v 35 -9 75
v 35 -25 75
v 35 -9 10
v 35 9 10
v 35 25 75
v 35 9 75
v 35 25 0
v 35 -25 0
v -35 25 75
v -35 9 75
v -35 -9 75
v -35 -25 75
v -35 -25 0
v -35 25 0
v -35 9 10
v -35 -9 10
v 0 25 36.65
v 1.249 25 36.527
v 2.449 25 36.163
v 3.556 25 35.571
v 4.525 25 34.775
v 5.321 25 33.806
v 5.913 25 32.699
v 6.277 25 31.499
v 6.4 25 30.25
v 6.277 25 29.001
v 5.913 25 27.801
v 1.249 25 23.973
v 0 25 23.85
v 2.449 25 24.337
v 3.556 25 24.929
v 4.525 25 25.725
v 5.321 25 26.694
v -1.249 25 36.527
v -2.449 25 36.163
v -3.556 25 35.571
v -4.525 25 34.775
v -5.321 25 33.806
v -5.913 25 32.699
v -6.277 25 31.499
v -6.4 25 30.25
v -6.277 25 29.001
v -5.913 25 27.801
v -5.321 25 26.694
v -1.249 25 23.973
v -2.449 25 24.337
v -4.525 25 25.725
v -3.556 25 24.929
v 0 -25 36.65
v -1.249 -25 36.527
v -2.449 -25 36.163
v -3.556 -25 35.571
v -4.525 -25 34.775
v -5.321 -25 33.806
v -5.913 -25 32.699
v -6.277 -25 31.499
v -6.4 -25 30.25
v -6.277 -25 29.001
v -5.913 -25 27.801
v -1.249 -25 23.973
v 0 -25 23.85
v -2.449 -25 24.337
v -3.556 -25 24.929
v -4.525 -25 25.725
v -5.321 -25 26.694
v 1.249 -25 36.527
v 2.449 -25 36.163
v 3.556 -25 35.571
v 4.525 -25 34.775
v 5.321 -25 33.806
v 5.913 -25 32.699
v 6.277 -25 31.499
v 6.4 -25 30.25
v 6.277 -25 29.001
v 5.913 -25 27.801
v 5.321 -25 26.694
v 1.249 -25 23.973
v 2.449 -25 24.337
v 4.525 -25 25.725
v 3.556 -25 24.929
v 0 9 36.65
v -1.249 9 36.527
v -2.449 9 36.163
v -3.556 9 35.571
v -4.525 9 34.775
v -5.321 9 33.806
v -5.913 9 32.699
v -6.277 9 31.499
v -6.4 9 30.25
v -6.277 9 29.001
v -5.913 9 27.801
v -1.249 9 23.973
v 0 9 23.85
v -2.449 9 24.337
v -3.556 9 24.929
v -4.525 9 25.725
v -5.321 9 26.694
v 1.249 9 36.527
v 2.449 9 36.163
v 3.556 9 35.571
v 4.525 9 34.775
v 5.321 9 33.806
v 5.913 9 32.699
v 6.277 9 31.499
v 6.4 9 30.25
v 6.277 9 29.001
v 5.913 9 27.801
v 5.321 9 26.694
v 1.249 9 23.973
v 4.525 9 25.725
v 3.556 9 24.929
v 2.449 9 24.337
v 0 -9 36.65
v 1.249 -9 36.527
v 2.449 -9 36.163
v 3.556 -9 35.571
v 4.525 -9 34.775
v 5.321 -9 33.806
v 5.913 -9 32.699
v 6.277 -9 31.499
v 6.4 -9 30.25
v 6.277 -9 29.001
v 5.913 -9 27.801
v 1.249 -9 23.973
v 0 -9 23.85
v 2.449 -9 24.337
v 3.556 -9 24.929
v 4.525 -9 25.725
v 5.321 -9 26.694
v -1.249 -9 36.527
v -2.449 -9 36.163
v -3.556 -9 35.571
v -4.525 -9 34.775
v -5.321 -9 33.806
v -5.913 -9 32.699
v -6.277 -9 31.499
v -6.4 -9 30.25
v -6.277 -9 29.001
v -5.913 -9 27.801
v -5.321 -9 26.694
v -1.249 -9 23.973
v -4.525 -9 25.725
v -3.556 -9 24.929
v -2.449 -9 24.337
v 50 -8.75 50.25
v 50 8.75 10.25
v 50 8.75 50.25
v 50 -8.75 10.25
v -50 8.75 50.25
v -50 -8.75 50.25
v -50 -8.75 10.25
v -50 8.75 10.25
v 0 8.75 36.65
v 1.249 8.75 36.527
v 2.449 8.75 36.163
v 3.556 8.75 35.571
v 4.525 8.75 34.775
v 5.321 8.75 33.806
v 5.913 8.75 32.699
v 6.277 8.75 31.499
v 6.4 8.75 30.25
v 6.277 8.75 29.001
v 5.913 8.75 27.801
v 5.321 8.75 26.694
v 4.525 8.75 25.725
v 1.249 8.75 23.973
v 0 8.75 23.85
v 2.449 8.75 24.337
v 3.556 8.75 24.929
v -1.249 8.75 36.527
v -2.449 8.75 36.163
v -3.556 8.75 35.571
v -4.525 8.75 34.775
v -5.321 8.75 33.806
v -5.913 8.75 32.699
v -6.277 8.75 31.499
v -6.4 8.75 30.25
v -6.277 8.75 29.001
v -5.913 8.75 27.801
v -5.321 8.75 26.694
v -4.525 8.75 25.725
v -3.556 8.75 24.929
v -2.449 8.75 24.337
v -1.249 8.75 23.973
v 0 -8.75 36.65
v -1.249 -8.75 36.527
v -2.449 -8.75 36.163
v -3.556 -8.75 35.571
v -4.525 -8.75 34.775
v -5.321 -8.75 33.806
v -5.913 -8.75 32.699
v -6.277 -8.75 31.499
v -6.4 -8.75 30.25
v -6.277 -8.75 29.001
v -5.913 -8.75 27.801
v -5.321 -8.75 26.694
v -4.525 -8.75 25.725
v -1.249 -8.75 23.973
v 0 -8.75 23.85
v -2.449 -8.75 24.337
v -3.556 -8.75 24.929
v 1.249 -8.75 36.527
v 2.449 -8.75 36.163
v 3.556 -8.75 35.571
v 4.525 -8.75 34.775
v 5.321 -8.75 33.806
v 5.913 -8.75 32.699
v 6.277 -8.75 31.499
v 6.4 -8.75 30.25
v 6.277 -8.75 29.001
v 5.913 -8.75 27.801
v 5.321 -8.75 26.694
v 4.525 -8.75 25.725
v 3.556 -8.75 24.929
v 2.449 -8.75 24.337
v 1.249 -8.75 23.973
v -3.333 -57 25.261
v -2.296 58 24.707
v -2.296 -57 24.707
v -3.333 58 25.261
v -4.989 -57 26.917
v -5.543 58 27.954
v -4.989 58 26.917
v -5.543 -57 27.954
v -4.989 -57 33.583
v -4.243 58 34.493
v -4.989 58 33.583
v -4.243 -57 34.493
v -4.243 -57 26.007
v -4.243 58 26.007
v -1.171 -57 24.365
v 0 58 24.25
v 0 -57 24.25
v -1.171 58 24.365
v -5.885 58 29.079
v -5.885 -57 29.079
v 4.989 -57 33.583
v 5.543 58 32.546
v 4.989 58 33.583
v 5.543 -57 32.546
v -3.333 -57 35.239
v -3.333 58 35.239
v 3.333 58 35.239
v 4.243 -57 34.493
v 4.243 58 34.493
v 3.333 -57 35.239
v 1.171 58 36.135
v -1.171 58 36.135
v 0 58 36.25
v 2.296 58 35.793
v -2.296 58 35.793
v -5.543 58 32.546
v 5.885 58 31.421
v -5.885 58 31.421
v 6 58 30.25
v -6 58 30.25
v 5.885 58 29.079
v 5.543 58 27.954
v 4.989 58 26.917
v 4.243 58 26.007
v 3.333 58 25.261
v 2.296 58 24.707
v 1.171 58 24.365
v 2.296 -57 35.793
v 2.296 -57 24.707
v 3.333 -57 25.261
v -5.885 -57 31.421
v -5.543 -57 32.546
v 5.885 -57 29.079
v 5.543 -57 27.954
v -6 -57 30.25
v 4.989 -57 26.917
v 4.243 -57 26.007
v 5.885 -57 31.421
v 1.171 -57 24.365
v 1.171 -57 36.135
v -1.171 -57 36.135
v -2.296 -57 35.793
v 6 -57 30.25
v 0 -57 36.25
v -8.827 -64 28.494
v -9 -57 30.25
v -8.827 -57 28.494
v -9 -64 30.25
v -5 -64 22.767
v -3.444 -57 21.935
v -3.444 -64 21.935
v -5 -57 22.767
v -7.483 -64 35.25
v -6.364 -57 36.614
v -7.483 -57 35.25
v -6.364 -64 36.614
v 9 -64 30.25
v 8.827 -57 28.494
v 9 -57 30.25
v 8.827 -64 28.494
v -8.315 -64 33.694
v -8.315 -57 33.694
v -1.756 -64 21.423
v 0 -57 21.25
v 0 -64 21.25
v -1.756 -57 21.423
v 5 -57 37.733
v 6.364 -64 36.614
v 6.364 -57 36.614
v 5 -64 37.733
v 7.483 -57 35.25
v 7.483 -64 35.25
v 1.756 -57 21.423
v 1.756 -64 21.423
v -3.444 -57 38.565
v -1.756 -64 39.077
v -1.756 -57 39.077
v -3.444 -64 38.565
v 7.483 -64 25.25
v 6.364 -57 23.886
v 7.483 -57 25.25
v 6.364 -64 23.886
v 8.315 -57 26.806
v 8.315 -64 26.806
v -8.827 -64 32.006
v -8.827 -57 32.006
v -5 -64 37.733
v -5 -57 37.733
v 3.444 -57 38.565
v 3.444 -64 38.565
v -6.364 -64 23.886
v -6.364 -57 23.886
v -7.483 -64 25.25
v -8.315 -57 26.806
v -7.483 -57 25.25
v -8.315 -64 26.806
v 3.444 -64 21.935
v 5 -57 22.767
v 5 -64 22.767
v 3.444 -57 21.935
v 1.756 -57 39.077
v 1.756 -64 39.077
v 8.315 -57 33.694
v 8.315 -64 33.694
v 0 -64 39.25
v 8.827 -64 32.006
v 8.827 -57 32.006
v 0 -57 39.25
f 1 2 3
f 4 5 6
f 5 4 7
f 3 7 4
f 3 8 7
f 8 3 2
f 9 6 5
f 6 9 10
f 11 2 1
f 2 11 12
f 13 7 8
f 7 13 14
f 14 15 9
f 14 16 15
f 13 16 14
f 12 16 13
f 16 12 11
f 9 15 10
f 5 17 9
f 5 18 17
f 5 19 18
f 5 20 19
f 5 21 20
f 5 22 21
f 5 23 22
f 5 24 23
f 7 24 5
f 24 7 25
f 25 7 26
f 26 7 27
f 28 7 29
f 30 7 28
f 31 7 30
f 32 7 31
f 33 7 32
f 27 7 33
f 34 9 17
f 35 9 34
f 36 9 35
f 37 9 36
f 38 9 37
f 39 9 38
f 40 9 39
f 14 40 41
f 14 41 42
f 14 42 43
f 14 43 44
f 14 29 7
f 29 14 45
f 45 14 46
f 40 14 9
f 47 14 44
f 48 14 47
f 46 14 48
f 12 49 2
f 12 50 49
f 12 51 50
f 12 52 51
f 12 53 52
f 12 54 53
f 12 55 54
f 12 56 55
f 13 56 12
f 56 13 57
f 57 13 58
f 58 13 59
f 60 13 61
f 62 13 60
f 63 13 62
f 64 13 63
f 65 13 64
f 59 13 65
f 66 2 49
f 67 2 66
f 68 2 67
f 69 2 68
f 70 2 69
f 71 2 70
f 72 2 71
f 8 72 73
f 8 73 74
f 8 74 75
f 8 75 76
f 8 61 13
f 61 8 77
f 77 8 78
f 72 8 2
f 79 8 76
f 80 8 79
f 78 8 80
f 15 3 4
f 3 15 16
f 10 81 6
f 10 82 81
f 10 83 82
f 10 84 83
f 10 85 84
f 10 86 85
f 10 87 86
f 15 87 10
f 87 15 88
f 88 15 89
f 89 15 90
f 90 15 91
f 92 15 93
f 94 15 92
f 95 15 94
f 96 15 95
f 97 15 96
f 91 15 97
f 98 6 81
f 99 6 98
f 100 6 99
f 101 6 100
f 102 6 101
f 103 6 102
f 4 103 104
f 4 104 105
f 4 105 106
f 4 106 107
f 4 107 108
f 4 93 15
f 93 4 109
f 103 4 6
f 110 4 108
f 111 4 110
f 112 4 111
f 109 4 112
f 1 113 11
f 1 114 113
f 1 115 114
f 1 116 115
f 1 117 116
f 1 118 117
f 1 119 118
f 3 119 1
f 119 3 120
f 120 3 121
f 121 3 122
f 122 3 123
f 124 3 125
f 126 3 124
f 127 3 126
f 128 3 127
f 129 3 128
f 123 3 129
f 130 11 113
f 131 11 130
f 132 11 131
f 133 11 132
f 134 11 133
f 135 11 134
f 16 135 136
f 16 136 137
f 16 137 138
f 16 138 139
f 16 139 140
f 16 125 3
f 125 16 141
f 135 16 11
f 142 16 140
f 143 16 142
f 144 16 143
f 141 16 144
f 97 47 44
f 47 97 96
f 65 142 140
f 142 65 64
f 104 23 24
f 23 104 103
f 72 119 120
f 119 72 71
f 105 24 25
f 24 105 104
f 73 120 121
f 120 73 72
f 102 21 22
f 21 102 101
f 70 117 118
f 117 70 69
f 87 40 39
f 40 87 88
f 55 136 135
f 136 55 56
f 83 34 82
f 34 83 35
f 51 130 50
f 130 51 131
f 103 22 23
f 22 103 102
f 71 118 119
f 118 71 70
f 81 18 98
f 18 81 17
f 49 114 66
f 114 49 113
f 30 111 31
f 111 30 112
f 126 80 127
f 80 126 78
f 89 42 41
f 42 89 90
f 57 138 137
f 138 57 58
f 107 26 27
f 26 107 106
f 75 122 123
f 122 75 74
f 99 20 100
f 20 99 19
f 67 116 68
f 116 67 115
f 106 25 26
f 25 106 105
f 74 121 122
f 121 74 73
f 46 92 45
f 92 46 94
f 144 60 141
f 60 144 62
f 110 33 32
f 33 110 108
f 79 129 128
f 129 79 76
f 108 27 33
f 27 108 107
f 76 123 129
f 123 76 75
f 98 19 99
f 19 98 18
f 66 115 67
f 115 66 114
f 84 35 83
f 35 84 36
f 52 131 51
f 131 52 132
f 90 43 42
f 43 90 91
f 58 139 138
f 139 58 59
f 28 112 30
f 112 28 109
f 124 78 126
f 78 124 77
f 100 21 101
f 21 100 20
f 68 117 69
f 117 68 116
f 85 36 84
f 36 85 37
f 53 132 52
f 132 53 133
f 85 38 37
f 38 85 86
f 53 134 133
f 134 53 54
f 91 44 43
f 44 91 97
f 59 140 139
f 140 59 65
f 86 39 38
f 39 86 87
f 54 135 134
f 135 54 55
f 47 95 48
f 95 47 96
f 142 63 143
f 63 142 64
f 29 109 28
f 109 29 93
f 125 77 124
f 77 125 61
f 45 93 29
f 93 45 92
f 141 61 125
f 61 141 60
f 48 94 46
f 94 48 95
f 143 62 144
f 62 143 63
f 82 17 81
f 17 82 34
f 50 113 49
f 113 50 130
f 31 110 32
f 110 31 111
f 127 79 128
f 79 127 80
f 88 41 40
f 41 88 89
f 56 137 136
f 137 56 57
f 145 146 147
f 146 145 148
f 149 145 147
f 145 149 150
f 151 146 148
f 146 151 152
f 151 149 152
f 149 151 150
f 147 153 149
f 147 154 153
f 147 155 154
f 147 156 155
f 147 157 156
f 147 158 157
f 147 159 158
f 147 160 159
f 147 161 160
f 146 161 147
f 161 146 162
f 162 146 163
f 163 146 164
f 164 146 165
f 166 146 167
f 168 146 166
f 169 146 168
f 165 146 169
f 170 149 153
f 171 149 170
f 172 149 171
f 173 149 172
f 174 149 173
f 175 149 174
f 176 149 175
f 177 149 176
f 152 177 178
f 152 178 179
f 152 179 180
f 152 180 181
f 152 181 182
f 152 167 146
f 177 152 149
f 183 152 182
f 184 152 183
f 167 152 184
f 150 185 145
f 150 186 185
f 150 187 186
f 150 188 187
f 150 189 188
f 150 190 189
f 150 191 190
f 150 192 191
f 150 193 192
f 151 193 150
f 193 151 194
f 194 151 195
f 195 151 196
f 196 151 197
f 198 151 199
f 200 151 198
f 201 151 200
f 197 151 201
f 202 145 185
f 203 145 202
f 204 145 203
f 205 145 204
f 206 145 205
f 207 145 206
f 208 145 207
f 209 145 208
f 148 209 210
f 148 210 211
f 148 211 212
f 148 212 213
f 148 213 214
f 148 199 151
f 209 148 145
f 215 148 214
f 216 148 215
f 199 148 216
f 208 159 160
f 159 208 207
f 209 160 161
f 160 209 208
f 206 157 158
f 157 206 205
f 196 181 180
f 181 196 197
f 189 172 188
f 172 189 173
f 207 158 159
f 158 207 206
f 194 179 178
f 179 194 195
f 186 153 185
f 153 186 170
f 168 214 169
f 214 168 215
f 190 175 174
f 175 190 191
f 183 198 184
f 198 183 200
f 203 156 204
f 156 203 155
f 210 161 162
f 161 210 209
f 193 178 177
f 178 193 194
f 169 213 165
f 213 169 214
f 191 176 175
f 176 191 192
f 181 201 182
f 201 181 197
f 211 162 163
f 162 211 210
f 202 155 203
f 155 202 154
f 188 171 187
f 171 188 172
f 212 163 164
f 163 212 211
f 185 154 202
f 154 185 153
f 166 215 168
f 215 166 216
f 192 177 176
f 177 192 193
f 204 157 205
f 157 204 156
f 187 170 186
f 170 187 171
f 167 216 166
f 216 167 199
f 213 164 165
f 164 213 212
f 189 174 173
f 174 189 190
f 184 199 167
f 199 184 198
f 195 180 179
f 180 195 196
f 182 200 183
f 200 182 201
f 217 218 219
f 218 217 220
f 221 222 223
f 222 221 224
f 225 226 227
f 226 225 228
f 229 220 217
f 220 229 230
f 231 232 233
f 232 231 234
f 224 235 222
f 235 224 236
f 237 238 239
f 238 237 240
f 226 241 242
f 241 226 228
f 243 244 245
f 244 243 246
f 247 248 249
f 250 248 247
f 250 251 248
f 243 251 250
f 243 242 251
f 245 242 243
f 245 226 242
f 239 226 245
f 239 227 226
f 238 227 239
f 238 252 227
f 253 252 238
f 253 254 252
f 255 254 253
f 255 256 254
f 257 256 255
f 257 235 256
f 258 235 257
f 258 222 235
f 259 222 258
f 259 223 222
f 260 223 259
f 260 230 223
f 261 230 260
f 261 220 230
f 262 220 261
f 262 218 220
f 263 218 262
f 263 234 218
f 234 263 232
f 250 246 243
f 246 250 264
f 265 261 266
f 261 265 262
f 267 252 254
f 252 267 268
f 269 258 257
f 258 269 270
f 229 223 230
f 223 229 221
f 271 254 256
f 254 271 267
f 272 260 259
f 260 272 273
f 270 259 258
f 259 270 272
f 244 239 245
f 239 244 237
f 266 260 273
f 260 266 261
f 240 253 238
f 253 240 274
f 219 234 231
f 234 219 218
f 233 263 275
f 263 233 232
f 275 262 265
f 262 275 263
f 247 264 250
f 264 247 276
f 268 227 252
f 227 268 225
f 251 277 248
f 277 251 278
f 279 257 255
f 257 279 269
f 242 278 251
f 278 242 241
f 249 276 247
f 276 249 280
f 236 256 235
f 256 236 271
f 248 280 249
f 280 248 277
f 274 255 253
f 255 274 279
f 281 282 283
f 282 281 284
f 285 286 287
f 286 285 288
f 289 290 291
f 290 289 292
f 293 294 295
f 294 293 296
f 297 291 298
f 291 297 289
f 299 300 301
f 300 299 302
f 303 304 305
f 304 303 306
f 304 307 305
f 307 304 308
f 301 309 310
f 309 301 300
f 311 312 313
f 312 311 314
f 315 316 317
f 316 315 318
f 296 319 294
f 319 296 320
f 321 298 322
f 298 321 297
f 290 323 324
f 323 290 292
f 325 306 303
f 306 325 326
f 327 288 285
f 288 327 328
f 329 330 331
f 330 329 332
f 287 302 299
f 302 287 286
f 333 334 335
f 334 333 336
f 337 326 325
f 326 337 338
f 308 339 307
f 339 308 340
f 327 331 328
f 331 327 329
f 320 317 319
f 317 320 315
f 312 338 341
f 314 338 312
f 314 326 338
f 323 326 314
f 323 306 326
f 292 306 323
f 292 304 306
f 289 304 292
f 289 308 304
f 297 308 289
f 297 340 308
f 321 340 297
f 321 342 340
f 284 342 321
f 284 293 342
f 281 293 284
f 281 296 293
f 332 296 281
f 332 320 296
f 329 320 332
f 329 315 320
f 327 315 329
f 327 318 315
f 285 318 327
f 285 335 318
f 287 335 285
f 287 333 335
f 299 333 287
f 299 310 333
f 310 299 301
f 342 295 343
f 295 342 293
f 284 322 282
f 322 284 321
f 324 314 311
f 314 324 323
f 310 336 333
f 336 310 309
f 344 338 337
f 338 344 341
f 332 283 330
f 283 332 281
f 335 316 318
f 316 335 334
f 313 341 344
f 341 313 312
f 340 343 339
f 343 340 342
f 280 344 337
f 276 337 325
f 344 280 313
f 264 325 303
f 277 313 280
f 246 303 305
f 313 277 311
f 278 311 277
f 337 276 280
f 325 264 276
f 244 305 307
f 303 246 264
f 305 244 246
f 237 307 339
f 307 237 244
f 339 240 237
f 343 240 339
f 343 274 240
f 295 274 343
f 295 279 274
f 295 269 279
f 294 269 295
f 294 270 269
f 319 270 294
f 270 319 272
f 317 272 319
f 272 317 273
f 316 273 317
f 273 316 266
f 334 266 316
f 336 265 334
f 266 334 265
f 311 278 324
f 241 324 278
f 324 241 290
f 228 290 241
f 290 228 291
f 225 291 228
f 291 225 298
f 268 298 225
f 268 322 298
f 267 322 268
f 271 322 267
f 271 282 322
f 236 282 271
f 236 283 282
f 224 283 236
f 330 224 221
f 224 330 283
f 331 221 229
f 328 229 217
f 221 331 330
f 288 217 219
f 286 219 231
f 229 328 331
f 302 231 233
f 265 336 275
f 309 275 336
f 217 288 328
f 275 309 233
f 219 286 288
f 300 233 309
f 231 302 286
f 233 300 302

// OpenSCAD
$fn = 32;

// ------------------------------------------------------------------------
// Clevis joint: 70 mm clevis, pin d12
// Every part is its own module, assembly() places them once.
// ------------------------------------------------------------------------

// --- part 1 ---
module clevis() {
  difference() {
    translate([-35, -25, 0]) cube([70, 50, 75]);
    translate([-36, -9, 10]) cube([72, 18, 66]);
    translate([0, 0, 30.25]) rotate([90, 0, 0]) cylinder(h = 52, d = 12.8, center = true);
  }
}

// --- part 2 ---
module eye() {
  difference() {
    translate([-50, -8.75, 0]) cube([100, 17.5, 40]);
    translate([0, 0, 20]) rotate([90, 0, 0]) cylinder(h = 19.5, d = 12.8, center = true);
  }
}

// --- part 3 ---
module pin() {
  rotate([0, 90, 0]) cylinder(h = 116, d = 12, center = true);
  translate([-64, 0, 0]) rotate([0, 90, 0]) cylinder(h = 7, d = 18);
}

// --- assembly ---
module assembly() {
  translate([0, 0, 0]) rotate([0, 0, 0]) clevis();
  translate([0, 0, 10.25]) rotate([0, 0, 0]) eye();
  translate([0, 0, 30.25]) rotate([0, 0, 90]) pin();
}

assembly();
